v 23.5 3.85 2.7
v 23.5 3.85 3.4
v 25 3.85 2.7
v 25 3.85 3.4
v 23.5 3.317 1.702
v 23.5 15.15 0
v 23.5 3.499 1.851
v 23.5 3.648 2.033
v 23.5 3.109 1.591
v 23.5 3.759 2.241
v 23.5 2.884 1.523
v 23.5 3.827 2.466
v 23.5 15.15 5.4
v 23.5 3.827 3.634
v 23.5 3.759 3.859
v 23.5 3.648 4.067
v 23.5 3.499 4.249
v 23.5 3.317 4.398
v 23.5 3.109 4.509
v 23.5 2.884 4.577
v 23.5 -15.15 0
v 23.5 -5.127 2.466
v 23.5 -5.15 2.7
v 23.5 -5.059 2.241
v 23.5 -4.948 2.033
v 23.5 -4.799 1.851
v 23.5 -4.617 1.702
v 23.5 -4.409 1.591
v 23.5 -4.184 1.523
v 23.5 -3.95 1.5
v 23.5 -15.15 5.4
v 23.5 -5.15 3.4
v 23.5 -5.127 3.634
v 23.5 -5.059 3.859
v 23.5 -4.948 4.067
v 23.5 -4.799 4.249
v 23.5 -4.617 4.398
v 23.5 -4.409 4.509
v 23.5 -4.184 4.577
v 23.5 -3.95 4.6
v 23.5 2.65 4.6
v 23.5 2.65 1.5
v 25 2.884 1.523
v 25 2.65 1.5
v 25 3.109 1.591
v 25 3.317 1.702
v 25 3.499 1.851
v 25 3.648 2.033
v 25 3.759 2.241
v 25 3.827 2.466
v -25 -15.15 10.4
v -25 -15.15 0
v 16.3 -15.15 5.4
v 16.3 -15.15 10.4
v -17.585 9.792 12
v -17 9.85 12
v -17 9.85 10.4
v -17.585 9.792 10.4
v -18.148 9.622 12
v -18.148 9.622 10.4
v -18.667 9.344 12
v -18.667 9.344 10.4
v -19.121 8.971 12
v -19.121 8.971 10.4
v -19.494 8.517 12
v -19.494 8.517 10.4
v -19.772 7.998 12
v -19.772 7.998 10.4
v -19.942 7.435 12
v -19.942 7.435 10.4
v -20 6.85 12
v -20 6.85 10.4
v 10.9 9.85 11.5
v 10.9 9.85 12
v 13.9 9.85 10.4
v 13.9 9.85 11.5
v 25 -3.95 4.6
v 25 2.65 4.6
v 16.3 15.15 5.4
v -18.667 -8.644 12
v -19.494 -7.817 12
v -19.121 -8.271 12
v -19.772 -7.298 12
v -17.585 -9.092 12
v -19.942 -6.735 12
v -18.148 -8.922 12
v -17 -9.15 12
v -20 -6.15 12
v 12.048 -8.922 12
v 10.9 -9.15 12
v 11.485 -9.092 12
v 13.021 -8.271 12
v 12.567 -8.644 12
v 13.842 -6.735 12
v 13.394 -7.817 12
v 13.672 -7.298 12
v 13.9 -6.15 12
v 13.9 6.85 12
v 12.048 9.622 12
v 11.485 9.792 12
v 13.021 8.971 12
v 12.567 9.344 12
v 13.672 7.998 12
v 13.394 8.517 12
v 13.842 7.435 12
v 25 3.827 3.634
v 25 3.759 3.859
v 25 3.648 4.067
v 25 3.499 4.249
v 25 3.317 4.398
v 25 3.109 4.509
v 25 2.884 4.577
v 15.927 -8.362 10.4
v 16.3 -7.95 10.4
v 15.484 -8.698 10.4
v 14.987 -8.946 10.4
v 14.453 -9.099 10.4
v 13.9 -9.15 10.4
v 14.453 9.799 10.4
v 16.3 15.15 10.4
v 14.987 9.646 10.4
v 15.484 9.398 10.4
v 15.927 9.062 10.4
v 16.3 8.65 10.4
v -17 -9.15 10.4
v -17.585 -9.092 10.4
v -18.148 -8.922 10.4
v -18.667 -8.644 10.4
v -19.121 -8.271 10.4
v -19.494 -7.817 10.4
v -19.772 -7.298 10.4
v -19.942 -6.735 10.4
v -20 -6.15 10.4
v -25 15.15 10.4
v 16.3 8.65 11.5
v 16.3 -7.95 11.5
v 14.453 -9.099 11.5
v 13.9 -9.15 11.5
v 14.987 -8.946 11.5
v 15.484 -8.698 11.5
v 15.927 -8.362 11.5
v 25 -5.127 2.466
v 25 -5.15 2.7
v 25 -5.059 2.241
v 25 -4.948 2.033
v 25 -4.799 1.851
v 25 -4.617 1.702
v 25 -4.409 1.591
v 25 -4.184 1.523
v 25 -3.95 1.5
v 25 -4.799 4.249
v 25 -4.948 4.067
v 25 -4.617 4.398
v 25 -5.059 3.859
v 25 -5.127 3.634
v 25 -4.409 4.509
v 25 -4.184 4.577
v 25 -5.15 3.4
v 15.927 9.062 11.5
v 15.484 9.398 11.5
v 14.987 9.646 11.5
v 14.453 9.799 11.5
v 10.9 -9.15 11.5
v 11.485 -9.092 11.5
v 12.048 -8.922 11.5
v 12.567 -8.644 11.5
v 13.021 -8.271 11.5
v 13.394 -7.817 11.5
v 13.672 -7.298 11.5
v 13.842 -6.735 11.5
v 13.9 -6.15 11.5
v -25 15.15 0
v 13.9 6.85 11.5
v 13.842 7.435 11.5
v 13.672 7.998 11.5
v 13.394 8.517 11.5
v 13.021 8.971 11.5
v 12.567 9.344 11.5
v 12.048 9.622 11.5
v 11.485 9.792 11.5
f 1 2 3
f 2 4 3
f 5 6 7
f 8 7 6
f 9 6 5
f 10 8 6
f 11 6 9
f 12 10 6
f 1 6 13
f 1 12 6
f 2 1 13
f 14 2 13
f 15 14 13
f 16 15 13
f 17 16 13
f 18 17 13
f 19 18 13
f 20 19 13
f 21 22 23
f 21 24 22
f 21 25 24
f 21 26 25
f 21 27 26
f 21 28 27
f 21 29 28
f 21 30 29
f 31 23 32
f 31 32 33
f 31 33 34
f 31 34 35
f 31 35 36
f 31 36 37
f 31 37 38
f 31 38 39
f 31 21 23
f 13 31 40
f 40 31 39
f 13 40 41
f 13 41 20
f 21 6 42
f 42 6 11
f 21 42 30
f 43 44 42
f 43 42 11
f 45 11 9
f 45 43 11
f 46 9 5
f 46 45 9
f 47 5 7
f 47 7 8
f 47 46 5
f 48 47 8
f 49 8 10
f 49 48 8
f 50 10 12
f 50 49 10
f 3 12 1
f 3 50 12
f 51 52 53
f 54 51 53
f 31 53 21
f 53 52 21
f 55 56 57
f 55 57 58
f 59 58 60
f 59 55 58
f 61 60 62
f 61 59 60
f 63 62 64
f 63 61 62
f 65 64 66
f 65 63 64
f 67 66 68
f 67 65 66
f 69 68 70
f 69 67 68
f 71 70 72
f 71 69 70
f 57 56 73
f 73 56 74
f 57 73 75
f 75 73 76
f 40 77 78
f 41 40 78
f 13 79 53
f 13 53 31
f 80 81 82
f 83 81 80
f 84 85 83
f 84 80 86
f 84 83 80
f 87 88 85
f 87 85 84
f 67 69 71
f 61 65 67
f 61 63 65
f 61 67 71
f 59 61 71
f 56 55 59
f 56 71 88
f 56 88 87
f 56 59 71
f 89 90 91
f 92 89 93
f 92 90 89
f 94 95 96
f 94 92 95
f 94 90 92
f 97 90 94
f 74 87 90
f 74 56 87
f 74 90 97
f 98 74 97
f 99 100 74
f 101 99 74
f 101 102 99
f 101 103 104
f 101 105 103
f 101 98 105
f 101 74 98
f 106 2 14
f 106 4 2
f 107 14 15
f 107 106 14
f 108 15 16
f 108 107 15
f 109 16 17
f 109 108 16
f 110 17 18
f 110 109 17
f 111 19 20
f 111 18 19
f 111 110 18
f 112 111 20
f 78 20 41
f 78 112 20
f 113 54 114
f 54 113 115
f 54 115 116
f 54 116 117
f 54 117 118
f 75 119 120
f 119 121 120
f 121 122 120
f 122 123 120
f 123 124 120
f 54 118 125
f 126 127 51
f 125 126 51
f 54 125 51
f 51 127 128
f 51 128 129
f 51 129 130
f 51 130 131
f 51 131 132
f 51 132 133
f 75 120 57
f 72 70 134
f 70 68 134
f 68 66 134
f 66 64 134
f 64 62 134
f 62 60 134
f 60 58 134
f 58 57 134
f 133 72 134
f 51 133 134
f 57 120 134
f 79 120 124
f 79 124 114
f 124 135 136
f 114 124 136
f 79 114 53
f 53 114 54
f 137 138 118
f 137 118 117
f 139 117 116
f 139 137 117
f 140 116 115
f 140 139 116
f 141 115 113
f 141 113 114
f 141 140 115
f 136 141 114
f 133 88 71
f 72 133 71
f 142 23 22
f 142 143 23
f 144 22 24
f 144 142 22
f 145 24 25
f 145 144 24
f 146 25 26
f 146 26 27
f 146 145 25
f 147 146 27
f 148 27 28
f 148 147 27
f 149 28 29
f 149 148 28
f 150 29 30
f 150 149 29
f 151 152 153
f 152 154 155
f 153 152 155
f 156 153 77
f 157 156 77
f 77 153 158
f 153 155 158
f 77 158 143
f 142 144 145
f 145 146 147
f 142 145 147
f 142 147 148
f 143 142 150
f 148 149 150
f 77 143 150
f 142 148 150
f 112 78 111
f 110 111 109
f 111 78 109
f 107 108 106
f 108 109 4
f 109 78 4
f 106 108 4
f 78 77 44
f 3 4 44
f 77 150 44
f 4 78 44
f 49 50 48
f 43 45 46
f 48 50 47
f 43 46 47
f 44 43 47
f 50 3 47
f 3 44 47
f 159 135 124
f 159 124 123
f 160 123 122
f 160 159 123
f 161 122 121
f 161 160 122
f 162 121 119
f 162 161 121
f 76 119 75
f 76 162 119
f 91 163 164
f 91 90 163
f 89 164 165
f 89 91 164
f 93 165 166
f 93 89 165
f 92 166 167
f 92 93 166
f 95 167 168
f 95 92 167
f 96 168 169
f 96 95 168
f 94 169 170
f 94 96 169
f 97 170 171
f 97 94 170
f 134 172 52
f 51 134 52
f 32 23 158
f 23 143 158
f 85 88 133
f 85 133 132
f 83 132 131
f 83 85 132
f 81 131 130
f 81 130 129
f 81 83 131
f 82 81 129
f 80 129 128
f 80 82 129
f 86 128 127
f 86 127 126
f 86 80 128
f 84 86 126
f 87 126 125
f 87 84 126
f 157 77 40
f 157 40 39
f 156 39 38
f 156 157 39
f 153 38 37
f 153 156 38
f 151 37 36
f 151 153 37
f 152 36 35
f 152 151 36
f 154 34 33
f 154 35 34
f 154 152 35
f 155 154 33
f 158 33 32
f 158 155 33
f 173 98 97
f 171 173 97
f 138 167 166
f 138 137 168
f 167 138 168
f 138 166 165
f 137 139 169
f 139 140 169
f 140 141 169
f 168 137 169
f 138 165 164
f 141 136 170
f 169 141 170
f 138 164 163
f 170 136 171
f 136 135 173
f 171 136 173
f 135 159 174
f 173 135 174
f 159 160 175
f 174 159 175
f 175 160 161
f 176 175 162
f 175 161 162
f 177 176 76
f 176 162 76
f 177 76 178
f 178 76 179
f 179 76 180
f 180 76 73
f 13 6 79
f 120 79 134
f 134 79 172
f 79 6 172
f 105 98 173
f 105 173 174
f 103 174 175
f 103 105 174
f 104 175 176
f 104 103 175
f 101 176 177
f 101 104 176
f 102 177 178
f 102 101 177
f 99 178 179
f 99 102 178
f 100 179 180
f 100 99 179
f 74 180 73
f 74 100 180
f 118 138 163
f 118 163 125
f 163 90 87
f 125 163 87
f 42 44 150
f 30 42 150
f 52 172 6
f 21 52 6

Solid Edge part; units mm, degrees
sketch "Sketch1" plane through (0, 0, 0) normal (0, 0, 1) x (1, 0, 0)
  line L0 (-25, -15.15) -> (25, -15.15)
  line L1 (25, -15.15) -> (25, 15.15)
  line L2 (25, 15.15) -> (-25, 15.15)
  line L3 (-25, 15.15) -> (-25, -15.15)
extrude "Protrusion1" add sketch "Sketch1" along normal blind 12
sketch "Sketch2" plane through (25, 0, 6) normal (1, 0, 0) x (0, 1, 0)
  line L0 (-0.65, -1.4) -> (2.65, -1.4)
  arc A0 (2.65, -1.4) -> (3.85, -2.6) centre (2.65, -2.6) cw
  line L1 (3.85, -2.6) -> (3.85, -3.3)
  arc A1 (2.65, -4.5) -> (3.85, -3.3) centre (2.65, -3.3) ccw
  line L2 (2.65, -4.5) -> (-3.95, -4.5)
  arc A2 (-5.15, -3.3) -> (-3.95, -4.5) centre (-3.95, -3.3) ccw
  line L3 (-5.15, -3.3) -> (-5.15, -2.6)
  arc A3 (-5.15, -2.6) -> (-3.95, -1.4) centre (-3.95, -2.6) cw
  line L4 (-3.95, -1.4) -> (-0.65, -1.4)
  line L5 (-15.15, -6) -> (15.15, -6)
  line L6 (15.15, -6) -> (15.15, 6)
  line L7 (15.15, 6) -> (-15.15, 6)
  line L8 (-15.15, 6) -> (-15.15, -6)
extrude "Wycięcie_1" cut sketch "Sketch2" against normal blind 1.5
sketch "Sketch3" plane through (-0.75, 0, 12) normal (0, 0, 1) x (1, 0, 0)
  line L0 (17.05, 15.15) -> (17.05, -15.15)
  line L1 (17.05, -15.15) -> (24.25, -15.15)
  line L2 (24.25, -15.15) -> (24.25, 15.15)
  line L3 (24.25, 15.15) -> (17.05, 15.15)
extrude "Wycięcie_2" cut sketch "Sketch3" against normal blind 6.6
sketch "Sketch4" plane through (-4.35, 0, 12) normal (0, 0, 1) x (1, 0, 0)
  line L0 (1.7674, -9.15) -> (-12.65, -9.15)
  arc A0 (-15.65, -6.15) -> (-12.65, -9.15) centre (-12.65, -6.15) ccw
  line L1 (-15.65, -6.15) -> (-15.65, 6.85)
  arc A1 (-15.65, 6.85) -> (-12.65, 9.85) centre (-12.65, 6.85) cw
  line L2 (-12.65, 9.85) -> (18.25, 9.85)
  arc A2 (18.25, 9.85) -> (21.25, 6.85) centre (18.25, 6.85) cw
  line L3 (21.25, 6.85) -> (21.25, -6.15)
  arc A3 (18.25, -9.15) -> (21.25, -6.15) centre (18.25, -6.15) ccw
  line L4 (18.25, -9.15) -> (1.7674, -9.15)
  line L5 (-28.1147, 19.5962) -> (36.8147, 19.5962)
  line L6 (36.8147, 19.5962) -> (36.8147, -19.5962)
  line L7 (36.8147, -19.5962) -> (-28.1147, -19.5962)
  line L8 (-28.1147, -19.5962) -> (-28.1147, 19.5962)
extrude "Wycięcie_3" cut sketch "Sketch4" against normal blind 1.6
sketch "Sketch5" plane through (-1.85, 0.35, 12) normal (0, 0, 1) x (1, 0, 0)
  line L0 (-18.15, 0) -> (-18.15, 6.5)
  arc A0 (-18.15, 6.5) -> (-15.15, 9.5) centre (-15.15, 6.5) cw
  line L1 (-15.15, 9.5) -> (12.75, 9.5)
  arc A1 (12.75, 9.5) -> (15.75, 6.5) centre (12.75, 6.5) cw
  line L2 (15.75, 6.5) -> (15.75, -6.5)
  arc A2 (15.75, -6.5) -> (12.75, -9.5) centre (12.75, -6.5) cw
  line L3 (-15.15, -9.5) -> (12.75, -9.5)
  arc A3 (-18.15, -6.5) -> (-15.15, -9.5) centre (-15.15, -6.5) ccw
  line L4 (-18.15, 0) -> (-18.15, -6.5)
  line L5 (-29.5576, 18.3934) -> (33.2576, 18.3934)
  line L6 (33.2576, 18.3934) -> (33.2576, -19.0934)
  line L7 (33.2576, -19.0934) -> (-29.5576, -19.0934)
  line L8 (-29.5576, -19.0934) -> (-29.5576, 18.3934)
extrude "Wycięcie_4" cut sketch "Sketch5" against normal blind 0.5
